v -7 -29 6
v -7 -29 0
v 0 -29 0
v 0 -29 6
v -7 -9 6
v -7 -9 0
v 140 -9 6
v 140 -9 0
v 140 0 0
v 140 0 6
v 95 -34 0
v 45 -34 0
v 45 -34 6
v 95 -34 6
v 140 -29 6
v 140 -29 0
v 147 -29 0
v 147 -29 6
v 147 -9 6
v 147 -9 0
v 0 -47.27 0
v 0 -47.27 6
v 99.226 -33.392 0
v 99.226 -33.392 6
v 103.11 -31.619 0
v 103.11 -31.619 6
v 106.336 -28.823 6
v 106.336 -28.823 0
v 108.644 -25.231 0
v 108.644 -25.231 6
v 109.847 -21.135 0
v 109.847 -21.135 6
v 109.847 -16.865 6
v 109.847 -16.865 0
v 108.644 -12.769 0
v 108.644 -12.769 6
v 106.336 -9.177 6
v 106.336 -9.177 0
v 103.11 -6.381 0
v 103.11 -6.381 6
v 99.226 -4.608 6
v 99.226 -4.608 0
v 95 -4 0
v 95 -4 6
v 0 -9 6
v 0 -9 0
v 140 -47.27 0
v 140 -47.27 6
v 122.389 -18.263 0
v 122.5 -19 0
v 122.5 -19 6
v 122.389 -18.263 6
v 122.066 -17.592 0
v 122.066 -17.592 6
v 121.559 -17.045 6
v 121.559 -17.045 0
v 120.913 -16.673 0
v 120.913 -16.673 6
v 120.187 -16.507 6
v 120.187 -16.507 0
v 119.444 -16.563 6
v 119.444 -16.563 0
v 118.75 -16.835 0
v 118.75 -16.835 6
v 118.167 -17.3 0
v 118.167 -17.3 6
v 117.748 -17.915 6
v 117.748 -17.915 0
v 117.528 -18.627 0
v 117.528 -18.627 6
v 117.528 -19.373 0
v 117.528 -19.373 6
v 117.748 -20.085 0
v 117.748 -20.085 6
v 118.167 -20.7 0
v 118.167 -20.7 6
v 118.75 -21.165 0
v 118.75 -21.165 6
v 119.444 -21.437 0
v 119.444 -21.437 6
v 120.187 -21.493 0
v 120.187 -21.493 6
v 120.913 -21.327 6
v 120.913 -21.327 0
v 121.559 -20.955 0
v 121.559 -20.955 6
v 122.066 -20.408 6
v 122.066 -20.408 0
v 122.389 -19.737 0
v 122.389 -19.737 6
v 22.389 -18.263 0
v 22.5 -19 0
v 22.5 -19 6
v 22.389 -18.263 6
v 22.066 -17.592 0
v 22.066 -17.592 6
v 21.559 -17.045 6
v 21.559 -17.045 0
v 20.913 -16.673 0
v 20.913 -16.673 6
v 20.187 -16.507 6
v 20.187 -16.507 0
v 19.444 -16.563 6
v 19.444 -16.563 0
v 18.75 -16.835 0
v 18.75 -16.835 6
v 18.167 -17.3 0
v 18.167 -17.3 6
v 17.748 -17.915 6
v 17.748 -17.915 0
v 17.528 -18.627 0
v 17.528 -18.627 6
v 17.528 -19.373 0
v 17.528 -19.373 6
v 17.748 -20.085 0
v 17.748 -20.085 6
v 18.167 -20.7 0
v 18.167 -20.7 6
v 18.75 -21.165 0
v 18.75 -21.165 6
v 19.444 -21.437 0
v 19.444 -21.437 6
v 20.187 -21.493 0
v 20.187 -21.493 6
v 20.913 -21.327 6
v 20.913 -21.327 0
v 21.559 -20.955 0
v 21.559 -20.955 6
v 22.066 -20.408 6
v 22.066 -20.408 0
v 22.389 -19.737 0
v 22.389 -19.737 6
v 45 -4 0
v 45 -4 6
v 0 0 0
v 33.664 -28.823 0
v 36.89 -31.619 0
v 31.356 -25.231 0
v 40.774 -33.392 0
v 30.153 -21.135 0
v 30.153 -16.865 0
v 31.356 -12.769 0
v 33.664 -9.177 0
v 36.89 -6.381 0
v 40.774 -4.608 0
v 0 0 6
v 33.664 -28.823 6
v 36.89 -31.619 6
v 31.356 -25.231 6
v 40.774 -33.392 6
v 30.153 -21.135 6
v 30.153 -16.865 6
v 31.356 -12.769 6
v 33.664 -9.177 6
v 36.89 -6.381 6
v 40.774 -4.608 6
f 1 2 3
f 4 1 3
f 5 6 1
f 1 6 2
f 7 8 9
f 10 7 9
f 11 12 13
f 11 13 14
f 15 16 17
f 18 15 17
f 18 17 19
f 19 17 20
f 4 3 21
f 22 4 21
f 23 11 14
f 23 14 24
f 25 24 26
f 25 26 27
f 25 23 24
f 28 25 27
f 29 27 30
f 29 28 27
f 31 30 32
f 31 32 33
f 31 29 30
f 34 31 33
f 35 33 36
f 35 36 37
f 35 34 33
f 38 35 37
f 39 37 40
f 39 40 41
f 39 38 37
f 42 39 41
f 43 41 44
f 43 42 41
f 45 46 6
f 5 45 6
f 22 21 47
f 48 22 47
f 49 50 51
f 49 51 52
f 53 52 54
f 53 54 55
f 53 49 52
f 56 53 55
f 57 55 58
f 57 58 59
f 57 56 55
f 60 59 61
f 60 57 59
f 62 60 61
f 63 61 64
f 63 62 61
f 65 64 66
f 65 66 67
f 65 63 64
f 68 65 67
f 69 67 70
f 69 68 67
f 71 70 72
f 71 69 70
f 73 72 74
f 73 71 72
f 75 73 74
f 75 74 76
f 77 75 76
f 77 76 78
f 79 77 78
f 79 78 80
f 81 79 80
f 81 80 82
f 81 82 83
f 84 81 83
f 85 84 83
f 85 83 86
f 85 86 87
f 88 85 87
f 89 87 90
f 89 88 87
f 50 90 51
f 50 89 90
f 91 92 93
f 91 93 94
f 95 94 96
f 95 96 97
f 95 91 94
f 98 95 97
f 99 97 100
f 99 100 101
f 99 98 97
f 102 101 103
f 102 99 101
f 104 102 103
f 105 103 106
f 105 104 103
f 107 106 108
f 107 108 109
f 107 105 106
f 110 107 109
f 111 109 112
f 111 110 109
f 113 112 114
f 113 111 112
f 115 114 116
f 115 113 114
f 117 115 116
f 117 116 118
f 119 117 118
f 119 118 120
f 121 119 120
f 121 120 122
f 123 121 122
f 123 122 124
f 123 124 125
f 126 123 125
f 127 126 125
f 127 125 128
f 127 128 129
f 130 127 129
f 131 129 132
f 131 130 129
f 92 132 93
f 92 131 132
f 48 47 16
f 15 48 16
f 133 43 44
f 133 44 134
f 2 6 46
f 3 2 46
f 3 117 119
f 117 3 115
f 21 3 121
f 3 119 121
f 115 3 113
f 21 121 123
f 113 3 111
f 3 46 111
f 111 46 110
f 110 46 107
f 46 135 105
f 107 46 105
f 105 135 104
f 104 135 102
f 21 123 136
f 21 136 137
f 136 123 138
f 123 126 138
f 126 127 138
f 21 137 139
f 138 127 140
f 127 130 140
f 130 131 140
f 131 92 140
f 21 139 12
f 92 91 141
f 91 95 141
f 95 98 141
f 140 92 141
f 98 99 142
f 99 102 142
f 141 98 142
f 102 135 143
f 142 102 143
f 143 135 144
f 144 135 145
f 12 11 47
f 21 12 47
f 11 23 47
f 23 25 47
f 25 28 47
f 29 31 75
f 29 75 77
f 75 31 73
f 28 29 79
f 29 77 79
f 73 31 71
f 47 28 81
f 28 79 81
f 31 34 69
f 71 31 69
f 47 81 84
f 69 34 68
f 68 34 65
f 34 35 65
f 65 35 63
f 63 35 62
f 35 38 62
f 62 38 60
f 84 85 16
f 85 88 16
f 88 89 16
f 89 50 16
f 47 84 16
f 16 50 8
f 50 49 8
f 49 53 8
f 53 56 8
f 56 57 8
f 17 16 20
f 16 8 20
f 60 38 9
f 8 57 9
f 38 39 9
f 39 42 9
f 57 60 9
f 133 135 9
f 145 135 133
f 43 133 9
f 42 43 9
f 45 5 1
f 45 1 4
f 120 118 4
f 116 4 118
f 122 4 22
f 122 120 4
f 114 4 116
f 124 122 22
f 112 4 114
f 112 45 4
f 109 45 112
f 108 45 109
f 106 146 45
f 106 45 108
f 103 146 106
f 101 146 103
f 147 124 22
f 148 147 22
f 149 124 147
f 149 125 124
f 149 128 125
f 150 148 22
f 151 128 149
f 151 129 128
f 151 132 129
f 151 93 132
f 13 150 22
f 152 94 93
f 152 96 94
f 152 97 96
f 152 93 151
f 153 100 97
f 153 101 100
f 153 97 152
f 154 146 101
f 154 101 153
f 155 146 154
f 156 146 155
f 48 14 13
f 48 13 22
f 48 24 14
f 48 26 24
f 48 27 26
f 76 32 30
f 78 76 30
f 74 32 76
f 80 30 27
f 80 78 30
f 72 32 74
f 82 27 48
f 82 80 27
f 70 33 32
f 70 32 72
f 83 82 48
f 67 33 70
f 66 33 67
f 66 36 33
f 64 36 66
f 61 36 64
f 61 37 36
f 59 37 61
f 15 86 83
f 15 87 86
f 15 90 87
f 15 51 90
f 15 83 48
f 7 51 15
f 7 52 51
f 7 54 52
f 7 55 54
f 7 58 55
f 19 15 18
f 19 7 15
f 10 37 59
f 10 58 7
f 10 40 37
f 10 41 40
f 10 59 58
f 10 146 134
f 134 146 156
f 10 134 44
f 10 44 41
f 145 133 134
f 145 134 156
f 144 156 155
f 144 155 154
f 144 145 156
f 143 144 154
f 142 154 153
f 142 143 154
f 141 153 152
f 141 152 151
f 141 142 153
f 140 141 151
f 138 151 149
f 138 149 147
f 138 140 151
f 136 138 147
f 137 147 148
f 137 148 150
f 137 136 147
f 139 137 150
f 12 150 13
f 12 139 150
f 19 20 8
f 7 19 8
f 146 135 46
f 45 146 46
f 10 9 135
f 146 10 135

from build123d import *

# Parameters (mm, degrees)
SKETCH1_R           = 2.5
BOSS_EXTRUDE1_DEPTH = 6


with BuildPart() as part:
    # Sketch1 → Boss-Extrude1 (new body)
    with BuildSketch(Plane.XY):
        Polygon((140, 0), (0, 0), (0, -9), (-7, -9), (-7, -29), (0, -29), (0, -47.27), (140, -47.27), (140, -29), (147, -29), (147, -9), (140, -9), align=None)
        with Locations((120, -19)):
            Circle(SKETCH1_R, mode=Mode.SUBTRACT)
        with Locations((20, -19)):
            Circle(SKETCH1_R, mode=Mode.SUBTRACT)
        with BuildLine():
            Line((45, -34), (95, -34))
            ThreePointArc((95, -34), (110, -19), (95, -4))
            Line((95, -4), (45, -4))
            ThreePointArc((45, -4), (30, -19), (45, -34))
        make_face(mode=Mode.SUBTRACT)
    extrude(amount=BOSS_EXTRUDE1_DEPTH)


solid = part.part
